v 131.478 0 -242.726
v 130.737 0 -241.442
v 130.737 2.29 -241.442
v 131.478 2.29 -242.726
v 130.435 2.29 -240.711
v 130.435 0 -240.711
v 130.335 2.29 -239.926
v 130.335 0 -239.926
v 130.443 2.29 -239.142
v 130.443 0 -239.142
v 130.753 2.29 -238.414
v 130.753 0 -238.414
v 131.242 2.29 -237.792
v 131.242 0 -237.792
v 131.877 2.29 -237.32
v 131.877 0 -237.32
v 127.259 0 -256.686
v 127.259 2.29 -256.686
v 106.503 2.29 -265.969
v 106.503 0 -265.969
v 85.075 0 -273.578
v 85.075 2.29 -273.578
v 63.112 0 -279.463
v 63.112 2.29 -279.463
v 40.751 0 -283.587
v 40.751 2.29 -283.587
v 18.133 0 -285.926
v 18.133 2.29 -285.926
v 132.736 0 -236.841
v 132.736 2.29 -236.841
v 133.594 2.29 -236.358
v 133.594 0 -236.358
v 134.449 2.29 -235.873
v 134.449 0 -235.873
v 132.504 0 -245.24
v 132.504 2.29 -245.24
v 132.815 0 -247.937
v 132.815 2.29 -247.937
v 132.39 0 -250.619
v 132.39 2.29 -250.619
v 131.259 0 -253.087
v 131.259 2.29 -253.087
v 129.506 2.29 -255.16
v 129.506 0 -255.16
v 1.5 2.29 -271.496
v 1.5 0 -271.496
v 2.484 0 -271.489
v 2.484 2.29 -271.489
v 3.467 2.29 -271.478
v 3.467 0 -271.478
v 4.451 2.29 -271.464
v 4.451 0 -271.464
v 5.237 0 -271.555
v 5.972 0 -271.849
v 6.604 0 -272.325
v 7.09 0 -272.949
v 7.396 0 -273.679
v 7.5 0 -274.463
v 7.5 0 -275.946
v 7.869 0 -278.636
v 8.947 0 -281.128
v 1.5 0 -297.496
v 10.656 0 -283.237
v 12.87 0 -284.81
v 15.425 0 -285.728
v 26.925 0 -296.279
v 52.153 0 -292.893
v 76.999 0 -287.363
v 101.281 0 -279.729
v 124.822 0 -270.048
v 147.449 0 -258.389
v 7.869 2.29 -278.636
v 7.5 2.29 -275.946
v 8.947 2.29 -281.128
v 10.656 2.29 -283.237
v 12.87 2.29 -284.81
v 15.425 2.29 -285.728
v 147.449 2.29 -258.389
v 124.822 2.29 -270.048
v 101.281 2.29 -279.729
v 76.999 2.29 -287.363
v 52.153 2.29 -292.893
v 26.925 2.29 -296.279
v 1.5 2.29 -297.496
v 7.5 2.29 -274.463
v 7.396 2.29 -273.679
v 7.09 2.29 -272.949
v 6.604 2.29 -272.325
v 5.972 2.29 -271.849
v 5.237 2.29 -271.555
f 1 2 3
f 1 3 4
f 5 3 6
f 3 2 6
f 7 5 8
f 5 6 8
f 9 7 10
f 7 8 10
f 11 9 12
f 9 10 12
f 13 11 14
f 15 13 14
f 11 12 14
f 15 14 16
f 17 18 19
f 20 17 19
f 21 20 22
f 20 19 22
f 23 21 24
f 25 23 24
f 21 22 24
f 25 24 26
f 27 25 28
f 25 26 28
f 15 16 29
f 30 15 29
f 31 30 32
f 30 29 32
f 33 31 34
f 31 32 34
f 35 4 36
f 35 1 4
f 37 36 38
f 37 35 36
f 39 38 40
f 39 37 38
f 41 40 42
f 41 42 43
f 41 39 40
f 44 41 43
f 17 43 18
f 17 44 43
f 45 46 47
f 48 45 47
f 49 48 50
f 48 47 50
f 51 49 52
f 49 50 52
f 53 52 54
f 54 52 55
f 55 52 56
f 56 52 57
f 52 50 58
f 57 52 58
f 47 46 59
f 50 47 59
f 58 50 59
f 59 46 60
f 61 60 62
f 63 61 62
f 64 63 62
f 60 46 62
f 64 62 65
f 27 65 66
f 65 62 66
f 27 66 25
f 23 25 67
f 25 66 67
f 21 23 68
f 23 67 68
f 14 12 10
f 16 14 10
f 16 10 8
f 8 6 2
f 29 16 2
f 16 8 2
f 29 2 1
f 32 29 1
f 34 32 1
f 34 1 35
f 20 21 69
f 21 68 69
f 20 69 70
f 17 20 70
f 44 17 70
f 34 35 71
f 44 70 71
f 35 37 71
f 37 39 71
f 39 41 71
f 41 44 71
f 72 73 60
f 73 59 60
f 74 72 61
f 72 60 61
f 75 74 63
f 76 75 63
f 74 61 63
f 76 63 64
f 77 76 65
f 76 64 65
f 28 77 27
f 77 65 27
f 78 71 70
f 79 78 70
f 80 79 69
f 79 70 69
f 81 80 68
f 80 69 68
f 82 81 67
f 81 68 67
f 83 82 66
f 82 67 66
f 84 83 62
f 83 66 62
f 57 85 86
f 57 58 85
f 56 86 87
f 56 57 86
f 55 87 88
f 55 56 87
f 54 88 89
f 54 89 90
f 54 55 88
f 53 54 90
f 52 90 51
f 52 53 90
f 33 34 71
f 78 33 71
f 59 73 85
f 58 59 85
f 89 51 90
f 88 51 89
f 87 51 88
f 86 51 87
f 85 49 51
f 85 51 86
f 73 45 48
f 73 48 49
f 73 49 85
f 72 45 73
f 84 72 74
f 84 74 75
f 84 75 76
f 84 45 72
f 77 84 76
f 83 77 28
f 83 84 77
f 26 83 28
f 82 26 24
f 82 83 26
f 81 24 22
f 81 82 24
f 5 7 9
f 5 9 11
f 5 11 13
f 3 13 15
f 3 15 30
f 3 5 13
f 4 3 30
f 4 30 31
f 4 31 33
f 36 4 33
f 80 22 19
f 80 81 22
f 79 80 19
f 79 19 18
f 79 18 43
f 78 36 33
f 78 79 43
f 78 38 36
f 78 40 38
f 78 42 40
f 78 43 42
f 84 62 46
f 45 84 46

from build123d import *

# Parameters (mm, degrees)
BOSS_EXTRUDE1_DEPTH = 2.29
CUT_EXTRUDE1_DEPTH  = 3
FILLET1_R           = 10
FILLET2_R           = 3


with BuildPart() as part:
    # Sketch1 → Boss-Extrude1 (new body)
    with BuildSketch(Plane(origin=(0, 0, 0), x_dir=(1, 0, 0), z_dir=(0, 1, 0))):
        with BuildLine():
            Line((1.5, 297.496218463), (1.5, 271.496218463))
            ThreePointArc((1.5, 271.496218463), (70.269464473, 262.249211634), (134.449071126, 235.872622221))
            Line((134.449071126, 235.872622221), (147.449071126, 258.389282719))
            ThreePointArc((147.449071126, 258.389282719), (76.998665918, 287.362933321), (1.5, 297.496218463))
        make_face()
    extrude(amount=BOSS_EXTRUDE1_DEPTH)

    # Sketch3 → Cut-Extrude1 (cut)
    with BuildSketch(Plane(origin=(0, 2.29, 0), x_dir=(1, 0, 0), z_dir=(0, 1, 0))):
        with BuildLine():
            Line((7.5, 271.396751344), (129.203185143, 238.786481168))
            Line((129.203185143, 238.786481168), (136.70589842, 251.781561758))
            ThreePointArc((136.70589842, 251.781561758), (74.15175015, 276.738099028), (7.5, 286.402177897))
            Line((7.5, 286.402177897), (7.5, 271.396751344))
        make_face()
    extrude(amount=-CUT_EXTRUDE1_DEPTH, mode=Mode.SUBTRACT)

    # Fillet1
    fillet1_edges = [part.edges().sort_by_distance(p)[0] for p in [
        (7.5, 1.145, -286.402177897),
        (136.70589842, 1.145, -251.781561758),
    ]]
    fillet(fillet1_edges, radius=FILLET1_R)

    # Fillet2
    fillet2_edges = [part.edges().sort_by_distance(p)[0] for p in [
        (7.5, 1.145, -271.396751344),
        (129.203185143, 1.145, -238.786481168),
    ]]
    fillet(fillet2_edges, radius=FILLET2_R)


solid = part.part
